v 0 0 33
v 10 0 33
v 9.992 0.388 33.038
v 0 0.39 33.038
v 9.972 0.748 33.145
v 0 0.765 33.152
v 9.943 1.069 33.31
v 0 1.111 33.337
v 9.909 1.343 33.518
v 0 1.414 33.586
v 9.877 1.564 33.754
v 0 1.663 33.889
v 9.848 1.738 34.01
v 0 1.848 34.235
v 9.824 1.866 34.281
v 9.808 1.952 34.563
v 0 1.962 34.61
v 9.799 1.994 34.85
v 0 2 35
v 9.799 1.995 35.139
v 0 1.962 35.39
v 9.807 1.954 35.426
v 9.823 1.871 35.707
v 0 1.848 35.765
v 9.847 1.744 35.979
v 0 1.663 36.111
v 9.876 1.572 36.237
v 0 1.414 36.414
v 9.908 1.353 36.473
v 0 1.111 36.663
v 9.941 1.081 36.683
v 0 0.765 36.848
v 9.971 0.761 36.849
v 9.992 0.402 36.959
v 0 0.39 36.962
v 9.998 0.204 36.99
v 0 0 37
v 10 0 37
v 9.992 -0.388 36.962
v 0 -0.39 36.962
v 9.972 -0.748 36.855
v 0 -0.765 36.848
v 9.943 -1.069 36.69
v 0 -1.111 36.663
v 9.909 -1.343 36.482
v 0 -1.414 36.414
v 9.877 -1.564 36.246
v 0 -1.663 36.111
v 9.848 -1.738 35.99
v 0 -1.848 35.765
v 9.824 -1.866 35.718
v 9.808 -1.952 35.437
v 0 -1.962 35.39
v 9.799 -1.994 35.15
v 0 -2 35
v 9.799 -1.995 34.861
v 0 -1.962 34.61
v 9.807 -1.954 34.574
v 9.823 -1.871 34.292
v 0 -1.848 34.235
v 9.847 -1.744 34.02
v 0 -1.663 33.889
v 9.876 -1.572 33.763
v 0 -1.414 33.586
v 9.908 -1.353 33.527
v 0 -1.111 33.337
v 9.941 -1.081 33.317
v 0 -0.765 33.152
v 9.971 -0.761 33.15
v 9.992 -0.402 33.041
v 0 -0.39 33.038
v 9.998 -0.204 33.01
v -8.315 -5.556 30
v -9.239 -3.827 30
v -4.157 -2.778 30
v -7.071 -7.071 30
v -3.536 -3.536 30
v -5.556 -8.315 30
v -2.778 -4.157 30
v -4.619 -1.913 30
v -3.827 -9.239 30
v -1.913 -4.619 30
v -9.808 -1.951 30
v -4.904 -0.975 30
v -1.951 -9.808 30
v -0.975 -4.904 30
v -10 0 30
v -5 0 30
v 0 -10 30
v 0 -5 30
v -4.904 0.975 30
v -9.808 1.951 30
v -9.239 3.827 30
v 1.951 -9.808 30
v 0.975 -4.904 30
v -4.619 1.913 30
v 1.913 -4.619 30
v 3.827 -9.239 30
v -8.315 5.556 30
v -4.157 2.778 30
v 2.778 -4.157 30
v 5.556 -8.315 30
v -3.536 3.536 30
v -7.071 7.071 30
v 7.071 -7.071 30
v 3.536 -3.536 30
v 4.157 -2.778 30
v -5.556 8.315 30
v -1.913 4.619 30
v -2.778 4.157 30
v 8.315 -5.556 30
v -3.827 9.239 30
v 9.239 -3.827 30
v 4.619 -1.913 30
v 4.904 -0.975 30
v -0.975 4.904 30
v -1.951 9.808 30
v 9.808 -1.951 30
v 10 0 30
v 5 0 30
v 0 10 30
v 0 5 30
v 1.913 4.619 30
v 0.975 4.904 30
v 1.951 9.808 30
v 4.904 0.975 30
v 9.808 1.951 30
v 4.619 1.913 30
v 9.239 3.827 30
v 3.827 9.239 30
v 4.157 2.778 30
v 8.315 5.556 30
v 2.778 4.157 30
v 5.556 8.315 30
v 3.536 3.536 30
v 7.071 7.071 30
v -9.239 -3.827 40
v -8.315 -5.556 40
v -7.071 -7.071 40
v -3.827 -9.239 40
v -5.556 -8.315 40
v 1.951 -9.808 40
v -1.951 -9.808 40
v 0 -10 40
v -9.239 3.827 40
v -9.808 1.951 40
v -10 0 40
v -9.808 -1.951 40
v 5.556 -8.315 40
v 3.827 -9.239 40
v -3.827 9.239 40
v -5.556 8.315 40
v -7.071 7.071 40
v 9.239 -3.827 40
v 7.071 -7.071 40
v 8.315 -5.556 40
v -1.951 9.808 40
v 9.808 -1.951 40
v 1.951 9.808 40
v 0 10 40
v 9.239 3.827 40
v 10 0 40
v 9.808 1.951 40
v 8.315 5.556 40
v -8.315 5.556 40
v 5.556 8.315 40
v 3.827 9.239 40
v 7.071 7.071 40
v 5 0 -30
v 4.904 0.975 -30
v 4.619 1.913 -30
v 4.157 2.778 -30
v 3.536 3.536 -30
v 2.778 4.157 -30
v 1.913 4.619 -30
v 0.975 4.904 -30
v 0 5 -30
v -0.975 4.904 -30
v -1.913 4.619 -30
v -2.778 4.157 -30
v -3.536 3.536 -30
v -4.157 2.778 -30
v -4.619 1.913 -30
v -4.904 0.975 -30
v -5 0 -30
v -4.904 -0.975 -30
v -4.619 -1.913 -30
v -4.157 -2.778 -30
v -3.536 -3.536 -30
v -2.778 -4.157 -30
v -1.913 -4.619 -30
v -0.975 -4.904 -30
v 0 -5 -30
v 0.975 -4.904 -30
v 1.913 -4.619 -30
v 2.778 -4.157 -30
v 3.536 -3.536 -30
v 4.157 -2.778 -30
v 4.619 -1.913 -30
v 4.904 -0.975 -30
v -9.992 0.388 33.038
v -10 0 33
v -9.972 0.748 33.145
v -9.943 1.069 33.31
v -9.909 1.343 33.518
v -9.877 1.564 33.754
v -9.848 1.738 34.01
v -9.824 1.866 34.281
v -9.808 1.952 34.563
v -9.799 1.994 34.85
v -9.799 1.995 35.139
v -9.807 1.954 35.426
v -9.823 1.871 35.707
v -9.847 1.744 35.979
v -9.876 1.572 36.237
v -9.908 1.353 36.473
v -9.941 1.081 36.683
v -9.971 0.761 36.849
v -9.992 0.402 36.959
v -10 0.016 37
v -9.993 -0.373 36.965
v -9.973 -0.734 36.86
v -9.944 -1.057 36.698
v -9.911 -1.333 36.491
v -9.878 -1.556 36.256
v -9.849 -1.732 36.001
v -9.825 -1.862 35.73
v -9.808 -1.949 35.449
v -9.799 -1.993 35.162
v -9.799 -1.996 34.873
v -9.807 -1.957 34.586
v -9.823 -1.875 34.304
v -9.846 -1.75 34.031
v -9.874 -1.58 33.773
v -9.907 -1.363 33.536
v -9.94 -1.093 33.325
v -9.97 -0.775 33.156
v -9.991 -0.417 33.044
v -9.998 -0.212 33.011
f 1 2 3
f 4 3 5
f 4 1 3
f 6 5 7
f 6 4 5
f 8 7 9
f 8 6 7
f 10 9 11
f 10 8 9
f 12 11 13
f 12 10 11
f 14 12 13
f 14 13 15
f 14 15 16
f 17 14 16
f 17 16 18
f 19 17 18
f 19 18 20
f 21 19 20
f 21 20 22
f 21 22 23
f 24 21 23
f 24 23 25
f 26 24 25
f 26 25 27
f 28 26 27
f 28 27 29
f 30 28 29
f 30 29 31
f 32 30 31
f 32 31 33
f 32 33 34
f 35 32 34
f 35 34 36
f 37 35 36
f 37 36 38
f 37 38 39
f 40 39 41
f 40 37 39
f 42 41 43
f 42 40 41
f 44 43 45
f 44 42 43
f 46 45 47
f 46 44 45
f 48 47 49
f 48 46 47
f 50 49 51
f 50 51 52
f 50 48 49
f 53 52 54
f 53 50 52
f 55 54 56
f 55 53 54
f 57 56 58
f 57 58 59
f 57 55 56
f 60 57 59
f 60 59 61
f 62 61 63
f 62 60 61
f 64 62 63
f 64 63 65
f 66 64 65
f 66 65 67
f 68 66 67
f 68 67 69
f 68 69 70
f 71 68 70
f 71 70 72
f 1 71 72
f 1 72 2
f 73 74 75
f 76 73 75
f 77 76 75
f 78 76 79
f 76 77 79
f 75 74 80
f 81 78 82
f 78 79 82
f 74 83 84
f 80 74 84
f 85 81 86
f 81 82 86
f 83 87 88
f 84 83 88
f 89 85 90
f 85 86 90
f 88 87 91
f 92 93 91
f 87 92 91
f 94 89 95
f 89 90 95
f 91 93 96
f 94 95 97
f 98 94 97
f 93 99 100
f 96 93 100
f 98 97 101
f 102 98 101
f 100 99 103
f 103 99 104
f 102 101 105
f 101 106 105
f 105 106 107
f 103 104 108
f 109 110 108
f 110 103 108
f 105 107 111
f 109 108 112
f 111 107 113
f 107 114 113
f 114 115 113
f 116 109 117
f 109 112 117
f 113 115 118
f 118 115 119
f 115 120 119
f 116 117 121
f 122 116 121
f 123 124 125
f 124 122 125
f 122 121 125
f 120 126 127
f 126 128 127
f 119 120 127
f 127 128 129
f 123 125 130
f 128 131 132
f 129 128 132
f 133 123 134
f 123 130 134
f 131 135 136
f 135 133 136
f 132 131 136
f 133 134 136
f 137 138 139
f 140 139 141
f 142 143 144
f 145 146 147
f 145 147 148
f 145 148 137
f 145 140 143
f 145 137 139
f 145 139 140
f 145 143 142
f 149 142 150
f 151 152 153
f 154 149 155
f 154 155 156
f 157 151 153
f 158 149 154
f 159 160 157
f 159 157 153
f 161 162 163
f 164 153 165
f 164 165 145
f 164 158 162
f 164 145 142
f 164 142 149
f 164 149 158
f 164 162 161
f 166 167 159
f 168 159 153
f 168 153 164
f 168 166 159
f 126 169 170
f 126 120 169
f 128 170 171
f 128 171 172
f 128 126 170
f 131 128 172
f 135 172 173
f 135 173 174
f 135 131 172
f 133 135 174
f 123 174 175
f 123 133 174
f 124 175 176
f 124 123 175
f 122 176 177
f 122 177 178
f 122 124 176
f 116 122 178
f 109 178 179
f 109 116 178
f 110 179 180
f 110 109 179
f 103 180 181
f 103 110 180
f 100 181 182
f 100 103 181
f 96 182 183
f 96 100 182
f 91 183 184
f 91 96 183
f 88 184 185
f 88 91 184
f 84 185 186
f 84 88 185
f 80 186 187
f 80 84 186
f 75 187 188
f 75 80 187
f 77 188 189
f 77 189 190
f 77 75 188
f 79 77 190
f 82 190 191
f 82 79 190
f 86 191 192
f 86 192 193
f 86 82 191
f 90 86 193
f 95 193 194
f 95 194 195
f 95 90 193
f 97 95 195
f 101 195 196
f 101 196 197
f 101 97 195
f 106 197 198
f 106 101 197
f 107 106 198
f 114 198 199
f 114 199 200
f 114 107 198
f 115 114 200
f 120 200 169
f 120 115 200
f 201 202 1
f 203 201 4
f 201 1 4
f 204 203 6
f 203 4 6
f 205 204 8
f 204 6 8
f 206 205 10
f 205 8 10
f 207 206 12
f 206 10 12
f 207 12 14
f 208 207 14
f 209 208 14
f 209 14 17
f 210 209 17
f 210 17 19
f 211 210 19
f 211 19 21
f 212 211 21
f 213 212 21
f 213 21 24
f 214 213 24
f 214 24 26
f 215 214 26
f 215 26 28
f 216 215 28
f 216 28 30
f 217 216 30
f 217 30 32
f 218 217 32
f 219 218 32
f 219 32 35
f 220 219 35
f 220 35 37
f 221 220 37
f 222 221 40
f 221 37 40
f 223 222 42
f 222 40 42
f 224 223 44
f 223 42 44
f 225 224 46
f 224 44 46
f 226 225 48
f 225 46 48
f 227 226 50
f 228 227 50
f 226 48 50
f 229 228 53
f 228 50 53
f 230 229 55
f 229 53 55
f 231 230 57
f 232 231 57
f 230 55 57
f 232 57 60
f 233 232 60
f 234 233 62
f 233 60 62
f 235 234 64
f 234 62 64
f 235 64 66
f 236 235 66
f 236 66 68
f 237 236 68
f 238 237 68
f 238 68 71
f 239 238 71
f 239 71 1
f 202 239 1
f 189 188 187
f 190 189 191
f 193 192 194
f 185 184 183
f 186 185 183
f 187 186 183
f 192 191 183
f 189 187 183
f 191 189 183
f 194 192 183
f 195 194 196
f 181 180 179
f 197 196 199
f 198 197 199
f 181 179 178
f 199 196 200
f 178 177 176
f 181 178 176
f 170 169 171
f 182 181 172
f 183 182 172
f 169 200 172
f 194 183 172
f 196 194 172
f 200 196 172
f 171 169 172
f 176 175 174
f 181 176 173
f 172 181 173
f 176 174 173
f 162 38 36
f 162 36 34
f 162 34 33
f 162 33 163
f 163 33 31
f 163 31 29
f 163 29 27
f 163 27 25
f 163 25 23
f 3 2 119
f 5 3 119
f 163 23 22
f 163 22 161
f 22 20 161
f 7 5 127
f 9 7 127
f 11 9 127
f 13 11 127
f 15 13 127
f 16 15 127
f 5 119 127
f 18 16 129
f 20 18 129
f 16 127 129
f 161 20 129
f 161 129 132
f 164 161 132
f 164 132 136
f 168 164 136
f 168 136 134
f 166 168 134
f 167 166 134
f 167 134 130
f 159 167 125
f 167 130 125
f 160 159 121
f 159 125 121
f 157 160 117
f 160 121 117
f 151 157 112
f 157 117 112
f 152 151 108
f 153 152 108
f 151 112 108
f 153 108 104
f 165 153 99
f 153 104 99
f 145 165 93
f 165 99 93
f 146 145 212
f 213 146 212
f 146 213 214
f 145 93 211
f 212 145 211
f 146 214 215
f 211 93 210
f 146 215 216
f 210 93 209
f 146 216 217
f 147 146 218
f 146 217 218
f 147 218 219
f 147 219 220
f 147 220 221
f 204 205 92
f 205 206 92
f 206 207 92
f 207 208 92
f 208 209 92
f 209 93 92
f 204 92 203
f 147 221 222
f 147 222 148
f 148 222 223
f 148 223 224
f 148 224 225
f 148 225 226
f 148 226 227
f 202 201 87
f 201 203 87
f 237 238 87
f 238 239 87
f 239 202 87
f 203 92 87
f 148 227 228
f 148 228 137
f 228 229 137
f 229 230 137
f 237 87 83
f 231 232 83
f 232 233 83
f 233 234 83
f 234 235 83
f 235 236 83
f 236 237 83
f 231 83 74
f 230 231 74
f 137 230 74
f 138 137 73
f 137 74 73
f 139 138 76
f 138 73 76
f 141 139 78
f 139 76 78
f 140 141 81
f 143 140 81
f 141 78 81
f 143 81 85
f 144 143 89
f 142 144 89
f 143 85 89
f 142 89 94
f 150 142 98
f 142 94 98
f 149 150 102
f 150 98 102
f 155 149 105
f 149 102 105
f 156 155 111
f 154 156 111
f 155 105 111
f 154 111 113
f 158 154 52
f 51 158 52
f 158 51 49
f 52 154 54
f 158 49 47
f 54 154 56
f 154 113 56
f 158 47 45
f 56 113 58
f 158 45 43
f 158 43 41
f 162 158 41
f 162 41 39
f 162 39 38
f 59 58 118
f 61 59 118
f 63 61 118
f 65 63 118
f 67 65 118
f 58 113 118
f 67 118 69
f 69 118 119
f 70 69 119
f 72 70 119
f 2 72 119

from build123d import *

# Parameters (mm, degrees)
SKETCH1_R               = 5
BOSS_EXTRUDE1_DEPTH     = 30
SKETCH3_R               = 10
BOSS_EXTRUDE3_DEPTH     = 10
SKETCH4_R               = 2
CUT_EXTRUDE1_DEPTH      = 11
CUT_EXTRUDE1_DEPTH_BACK = 11


with BuildPart() as part:
    # Sketch1 → Boss-Extrude1 (new body, symmetric)
    with BuildSketch(Plane.XY):
        Circle(SKETCH1_R)
    extrude(amount=BOSS_EXTRUDE1_DEPTH, both=True)

    # Sketch3 → Boss-Extrude3 (add)
    with BuildSketch(Plane.XY.offset(30)):
        Circle(SKETCH3_R)
    extrude(amount=BOSS_EXTRUDE3_DEPTH)

    # Sketch4 → Cut-Extrude1 (cut, two sides)
    with BuildSketch(Plane(origin=(0, 0, 0), x_dir=(0, 0, -1), z_dir=(1, 0, 0))) as cut_extrude1_sk:
        with Locations((-35, 0)):
            Circle(SKETCH4_R)
    extrude(amount=CUT_EXTRUDE1_DEPTH, mode=Mode.SUBTRACT)
    extrude(cut_extrude1_sk.sketch, amount=-CUT_EXTRUDE1_DEPTH_BACK, mode=Mode.SUBTRACT)


solid = part.part
